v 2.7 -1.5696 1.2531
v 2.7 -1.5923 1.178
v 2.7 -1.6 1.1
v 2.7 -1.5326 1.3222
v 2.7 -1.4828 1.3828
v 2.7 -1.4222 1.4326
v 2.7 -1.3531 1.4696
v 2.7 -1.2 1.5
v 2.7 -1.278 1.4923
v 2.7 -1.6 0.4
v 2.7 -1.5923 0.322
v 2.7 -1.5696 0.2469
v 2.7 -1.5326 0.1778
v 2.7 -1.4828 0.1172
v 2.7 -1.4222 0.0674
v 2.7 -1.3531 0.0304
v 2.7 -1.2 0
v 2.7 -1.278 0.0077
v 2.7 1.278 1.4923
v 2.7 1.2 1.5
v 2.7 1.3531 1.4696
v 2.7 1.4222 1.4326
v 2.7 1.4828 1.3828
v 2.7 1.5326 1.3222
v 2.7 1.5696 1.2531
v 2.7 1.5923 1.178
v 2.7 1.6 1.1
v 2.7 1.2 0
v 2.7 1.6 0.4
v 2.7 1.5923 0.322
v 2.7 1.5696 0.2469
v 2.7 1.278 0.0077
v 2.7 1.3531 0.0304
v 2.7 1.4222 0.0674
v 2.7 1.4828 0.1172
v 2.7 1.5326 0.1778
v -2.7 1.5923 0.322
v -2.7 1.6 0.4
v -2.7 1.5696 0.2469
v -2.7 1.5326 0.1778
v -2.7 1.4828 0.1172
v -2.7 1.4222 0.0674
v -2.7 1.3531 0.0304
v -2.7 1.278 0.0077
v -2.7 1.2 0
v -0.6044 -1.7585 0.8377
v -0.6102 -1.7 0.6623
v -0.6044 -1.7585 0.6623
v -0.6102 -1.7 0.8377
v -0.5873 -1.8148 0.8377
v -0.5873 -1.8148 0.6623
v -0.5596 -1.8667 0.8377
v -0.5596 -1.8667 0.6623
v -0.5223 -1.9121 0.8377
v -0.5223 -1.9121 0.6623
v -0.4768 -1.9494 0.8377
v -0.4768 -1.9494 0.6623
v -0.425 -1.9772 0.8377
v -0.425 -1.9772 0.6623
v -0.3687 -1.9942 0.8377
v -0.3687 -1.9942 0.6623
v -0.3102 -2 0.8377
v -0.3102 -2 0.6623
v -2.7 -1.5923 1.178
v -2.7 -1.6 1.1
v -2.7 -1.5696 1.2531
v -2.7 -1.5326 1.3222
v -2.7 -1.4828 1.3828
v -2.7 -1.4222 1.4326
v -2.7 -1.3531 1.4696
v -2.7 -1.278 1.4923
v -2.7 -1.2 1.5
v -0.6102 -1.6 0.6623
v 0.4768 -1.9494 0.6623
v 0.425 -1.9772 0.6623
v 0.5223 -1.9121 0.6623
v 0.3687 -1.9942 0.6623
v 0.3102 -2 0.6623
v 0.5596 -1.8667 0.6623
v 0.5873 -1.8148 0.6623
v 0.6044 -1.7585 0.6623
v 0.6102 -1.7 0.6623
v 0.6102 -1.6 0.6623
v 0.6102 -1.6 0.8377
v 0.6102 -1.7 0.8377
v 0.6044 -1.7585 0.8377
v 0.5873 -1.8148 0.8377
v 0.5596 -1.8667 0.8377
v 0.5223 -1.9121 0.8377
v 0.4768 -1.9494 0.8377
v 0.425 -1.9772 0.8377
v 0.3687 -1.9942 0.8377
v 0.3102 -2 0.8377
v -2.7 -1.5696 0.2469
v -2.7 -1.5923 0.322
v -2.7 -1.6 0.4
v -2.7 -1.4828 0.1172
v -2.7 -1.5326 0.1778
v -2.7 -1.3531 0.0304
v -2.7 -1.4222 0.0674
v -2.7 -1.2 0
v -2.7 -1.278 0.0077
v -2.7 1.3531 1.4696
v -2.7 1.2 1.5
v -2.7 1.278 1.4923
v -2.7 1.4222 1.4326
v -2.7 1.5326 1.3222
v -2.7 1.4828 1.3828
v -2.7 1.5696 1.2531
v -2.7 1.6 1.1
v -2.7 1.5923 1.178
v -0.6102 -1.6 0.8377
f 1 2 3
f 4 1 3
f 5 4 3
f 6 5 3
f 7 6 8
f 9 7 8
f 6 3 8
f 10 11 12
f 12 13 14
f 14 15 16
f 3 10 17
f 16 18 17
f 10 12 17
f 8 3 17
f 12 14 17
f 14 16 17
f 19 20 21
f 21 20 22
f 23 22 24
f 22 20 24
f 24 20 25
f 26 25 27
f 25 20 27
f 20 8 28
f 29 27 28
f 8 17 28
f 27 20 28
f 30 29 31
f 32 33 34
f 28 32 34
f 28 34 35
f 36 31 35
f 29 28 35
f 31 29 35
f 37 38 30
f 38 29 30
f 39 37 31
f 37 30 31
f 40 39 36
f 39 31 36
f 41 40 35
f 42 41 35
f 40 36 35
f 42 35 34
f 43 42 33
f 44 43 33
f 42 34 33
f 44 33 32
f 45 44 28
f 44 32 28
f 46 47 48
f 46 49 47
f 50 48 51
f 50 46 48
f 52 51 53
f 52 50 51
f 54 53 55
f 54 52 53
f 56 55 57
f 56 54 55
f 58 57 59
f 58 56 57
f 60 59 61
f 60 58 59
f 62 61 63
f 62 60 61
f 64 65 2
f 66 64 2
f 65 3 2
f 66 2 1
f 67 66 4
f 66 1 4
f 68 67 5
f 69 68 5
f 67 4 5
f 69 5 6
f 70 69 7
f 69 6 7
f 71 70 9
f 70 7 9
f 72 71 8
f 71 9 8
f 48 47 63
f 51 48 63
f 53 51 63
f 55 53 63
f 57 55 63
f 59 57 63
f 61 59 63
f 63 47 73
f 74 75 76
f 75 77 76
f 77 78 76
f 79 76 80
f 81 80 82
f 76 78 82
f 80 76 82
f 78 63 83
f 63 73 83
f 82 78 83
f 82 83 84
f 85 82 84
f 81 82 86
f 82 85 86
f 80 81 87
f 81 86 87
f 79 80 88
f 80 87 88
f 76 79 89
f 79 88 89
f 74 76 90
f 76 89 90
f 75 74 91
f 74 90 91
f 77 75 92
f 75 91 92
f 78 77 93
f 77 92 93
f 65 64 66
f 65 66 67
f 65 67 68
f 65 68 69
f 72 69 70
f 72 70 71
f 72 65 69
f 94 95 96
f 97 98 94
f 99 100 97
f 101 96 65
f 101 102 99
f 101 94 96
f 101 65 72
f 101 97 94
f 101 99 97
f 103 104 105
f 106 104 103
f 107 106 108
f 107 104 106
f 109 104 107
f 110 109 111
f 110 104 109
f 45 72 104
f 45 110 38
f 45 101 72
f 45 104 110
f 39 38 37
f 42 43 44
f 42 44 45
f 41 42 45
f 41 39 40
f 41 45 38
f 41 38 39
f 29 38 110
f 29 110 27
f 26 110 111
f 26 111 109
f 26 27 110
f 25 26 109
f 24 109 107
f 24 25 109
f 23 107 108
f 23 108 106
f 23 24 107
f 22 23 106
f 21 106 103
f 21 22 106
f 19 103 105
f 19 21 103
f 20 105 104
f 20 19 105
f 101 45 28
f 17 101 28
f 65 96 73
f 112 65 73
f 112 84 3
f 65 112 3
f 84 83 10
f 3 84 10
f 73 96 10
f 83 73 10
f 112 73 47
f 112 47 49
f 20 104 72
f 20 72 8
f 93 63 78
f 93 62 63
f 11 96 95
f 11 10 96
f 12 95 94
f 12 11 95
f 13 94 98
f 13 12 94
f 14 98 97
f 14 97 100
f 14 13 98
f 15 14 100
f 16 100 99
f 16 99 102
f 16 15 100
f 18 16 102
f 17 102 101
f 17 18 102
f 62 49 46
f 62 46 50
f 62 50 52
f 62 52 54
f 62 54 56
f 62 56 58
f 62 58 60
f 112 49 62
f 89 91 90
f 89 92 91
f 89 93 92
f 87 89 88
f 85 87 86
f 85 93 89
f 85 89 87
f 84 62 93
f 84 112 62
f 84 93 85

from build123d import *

# Parameters (mm, degrees)
F0_W     = 5.4
F0_H     = 3.2
F1_DEPTH = 1.5
F2_R     = 0.4
F3_W     = 1.22033
F3_H     = 0.175384
F4_DEPTH = 0.4
F5_R     = 0.3


with BuildPart() as f1:
    # F0 (on Top) → F1 (new body)
    with BuildSketch(Plane.XY):
        Rectangle(F0_W, F0_H)
    extrude(amount=F1_DEPTH)

    # F2
    f2_edges = [f1.edges().sort_by_distance(p)[0] for p in [
        (0, -1.6, 1.5),
        (0, -1.6, 0),
        (0, 1.6, 1.5),
        (0, 1.6, 0),
    ]]
    fillet(f2_edges, radius=F2_R)

    # F3 (on face) → F4 (join)
    with BuildSketch(Plane.XZ.offset(1.6)):
        with Locations((0, 0.75)):
            Rectangle(F3_W, F3_H)
    extrude(amount=F4_DEPTH)

    # F5
    f5_edges = [f1.edges().sort_by_distance(p)[0] for p in [
        (-0.610165, -2, 0.75),
        (0.610165, -2, 0.75),
    ]]
    fillet(f5_edges, radius=F5_R)


solid = f1.part
